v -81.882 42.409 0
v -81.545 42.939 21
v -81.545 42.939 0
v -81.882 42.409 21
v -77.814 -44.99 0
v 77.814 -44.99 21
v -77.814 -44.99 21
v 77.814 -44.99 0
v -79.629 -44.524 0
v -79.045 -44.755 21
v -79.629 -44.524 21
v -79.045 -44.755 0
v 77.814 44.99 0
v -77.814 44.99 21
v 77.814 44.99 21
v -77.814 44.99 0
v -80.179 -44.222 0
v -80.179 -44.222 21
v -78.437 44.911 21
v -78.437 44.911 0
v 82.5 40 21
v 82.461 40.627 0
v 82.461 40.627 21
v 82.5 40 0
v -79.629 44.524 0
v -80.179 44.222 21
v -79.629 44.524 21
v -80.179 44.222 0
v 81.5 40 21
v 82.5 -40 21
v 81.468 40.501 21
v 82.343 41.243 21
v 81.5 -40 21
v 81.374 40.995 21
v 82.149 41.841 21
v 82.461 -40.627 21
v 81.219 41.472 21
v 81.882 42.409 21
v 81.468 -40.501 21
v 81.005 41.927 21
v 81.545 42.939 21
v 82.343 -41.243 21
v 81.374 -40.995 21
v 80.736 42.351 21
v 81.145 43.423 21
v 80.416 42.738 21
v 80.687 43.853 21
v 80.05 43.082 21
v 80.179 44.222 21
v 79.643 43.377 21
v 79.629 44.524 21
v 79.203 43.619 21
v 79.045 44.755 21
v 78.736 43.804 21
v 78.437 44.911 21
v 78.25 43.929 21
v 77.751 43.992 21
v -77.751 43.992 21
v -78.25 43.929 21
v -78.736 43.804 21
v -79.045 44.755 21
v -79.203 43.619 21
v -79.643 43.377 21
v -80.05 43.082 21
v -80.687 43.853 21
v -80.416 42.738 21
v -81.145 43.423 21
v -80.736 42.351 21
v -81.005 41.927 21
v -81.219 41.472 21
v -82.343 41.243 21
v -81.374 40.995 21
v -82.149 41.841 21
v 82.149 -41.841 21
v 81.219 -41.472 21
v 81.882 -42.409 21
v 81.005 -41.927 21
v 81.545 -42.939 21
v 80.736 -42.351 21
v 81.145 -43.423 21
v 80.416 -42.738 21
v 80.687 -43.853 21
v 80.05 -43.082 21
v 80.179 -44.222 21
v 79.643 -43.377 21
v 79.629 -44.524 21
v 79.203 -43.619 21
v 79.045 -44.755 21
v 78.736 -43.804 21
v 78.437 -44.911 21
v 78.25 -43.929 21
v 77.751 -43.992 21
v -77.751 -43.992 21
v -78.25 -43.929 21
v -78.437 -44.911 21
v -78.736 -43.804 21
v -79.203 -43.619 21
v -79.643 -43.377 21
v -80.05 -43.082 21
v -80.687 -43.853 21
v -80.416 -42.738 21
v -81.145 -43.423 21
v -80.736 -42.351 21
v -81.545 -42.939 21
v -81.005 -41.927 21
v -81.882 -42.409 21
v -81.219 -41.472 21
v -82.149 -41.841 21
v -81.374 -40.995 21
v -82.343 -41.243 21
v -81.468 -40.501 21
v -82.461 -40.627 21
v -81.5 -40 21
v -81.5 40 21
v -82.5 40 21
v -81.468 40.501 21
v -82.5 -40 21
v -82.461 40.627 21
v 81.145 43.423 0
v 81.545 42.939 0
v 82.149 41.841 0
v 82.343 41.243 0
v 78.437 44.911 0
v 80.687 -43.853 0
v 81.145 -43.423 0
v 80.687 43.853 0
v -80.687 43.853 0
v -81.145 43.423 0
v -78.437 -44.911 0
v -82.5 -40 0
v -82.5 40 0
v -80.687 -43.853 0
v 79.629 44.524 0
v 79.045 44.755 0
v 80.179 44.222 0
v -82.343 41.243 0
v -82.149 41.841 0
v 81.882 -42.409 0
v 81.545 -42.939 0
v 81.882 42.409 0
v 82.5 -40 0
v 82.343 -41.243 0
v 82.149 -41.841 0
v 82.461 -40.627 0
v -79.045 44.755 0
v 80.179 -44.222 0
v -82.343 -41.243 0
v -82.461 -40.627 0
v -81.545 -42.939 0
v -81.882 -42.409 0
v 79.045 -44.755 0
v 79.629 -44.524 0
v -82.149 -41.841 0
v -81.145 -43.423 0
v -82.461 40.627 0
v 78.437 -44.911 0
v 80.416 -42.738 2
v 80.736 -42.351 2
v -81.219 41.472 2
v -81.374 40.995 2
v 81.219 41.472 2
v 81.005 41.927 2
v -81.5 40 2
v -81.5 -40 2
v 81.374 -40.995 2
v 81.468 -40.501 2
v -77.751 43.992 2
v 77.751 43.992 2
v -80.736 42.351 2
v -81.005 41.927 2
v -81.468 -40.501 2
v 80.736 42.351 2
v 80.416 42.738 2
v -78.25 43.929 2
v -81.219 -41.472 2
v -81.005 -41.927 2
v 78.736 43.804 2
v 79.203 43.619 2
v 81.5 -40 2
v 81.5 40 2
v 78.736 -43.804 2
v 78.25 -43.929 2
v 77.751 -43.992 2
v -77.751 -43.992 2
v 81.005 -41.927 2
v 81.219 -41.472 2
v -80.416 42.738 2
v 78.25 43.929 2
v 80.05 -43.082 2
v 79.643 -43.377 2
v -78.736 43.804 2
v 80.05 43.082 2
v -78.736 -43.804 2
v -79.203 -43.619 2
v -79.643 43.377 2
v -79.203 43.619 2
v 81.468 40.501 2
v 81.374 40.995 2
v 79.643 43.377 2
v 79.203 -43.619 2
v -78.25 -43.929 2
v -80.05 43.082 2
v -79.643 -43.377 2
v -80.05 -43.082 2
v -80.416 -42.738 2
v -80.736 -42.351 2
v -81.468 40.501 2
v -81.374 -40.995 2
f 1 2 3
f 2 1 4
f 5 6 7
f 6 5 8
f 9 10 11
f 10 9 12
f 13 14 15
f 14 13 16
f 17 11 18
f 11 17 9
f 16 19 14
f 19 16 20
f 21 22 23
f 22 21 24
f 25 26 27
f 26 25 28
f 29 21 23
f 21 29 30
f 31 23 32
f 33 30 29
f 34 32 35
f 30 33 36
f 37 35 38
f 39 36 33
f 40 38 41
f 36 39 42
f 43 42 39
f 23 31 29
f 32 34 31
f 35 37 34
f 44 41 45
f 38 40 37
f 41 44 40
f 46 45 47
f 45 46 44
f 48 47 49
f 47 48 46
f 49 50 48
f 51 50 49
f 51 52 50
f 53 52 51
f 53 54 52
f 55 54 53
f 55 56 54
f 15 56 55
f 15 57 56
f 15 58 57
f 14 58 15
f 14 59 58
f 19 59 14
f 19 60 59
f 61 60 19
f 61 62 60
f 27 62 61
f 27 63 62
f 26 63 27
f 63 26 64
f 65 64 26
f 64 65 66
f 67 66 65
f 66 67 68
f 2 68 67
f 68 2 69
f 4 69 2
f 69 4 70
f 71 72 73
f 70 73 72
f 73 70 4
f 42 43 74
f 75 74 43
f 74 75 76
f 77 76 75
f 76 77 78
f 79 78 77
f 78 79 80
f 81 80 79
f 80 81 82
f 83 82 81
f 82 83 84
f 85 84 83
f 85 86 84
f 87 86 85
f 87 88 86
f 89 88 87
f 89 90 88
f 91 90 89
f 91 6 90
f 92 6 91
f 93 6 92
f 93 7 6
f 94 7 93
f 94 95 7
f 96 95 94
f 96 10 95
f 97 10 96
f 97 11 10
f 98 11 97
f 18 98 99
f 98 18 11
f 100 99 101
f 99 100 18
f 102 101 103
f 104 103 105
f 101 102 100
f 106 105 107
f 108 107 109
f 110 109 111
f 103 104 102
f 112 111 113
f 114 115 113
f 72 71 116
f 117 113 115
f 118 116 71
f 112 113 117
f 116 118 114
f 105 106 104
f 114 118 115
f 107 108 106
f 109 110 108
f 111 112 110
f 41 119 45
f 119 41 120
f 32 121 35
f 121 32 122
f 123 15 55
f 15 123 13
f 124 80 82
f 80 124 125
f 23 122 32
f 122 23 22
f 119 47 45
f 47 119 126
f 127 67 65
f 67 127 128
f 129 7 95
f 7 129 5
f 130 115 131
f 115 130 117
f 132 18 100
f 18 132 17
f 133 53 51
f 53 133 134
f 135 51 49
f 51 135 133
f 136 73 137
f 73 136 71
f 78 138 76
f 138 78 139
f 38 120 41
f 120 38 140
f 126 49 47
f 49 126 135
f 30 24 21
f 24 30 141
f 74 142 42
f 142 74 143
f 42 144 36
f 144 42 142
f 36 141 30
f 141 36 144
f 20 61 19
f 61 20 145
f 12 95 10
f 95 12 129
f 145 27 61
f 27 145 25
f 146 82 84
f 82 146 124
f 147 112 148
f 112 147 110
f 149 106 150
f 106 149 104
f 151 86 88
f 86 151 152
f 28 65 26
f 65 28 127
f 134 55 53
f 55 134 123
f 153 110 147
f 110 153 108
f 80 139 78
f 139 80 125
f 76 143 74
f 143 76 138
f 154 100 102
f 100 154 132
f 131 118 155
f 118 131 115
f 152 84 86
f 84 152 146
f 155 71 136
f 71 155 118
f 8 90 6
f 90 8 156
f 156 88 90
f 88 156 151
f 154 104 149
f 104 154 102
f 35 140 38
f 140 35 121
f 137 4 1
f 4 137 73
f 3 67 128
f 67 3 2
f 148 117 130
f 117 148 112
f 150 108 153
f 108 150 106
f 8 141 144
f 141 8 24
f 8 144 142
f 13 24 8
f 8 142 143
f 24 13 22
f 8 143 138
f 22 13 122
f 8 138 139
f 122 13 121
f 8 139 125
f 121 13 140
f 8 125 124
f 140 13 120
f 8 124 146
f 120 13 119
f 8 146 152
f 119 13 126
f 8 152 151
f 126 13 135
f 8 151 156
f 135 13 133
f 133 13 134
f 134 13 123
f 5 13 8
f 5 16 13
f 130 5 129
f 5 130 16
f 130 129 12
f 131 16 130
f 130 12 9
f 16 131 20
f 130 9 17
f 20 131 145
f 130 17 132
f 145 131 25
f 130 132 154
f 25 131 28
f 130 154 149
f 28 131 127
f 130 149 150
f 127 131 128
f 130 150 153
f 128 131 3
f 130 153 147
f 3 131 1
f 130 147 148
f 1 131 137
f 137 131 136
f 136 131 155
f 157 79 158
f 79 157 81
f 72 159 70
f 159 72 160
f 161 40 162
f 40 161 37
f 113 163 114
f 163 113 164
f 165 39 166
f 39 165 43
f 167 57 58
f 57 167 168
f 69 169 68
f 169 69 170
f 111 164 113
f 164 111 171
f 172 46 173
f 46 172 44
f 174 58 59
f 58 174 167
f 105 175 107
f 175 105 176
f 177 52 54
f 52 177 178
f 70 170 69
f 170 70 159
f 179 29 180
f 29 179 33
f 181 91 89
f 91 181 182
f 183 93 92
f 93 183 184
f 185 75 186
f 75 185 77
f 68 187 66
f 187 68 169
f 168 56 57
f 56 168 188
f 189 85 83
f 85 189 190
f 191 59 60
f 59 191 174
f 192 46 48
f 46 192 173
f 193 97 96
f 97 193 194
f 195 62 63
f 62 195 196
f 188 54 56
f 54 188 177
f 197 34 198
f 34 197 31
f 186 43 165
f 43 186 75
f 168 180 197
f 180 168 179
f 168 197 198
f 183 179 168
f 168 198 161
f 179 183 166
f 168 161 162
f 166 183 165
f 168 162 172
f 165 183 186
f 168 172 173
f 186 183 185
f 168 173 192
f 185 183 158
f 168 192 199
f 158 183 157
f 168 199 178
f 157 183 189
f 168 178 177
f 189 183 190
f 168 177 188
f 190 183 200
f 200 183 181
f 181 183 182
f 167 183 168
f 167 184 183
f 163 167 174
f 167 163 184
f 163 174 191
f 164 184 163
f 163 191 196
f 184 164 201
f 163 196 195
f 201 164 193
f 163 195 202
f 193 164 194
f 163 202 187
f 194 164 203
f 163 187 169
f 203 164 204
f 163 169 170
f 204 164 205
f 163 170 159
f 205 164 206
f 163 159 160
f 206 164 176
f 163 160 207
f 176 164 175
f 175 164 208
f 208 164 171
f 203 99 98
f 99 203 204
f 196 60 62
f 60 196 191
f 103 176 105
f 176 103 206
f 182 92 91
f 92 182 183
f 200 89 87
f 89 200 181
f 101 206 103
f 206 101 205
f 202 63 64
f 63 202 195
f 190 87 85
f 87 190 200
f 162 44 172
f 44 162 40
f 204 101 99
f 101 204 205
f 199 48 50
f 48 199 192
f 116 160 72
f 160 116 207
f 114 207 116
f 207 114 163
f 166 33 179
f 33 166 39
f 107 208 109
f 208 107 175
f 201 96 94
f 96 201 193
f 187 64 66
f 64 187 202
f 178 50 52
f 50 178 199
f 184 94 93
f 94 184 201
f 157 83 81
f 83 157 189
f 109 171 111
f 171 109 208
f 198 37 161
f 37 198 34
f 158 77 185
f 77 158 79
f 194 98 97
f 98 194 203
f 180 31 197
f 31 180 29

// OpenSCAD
$fn = 50;


difference() {
	union() {
		hull() {
			translate(v = [-77.5000000000, 40.0000000000, 0]) {
				cylinder(h = 21, r = 5);
			}
			translate(v = [77.5000000000, 40.0000000000, 0]) {
				cylinder(h = 21, r = 5);
			}
			translate(v = [-77.5000000000, -40.0000000000, 0]) {
				cylinder(h = 21, r = 5);
			}
			translate(v = [77.5000000000, -40.0000000000, 0]) {
				cylinder(h = 21, r = 5);
			}
		}
	}
	union() {
		translate(v = [0, 0, 2]) {
			hull() {
				translate(v = [-77.5000000000, 40.0000000000, 0]) {
					cylinder(h = 19, r = 4);
				}
				translate(v = [77.5000000000, 40.0000000000, 0]) {
					cylinder(h = 19, r = 4);
				}
				translate(v = [-77.5000000000, -40.0000000000, 0]) {
					cylinder(h = 19, r = 4);
				}
				translate(v = [77.5000000000, -40.0000000000, 0]) {
					cylinder(h = 19, r = 4);
				}
			}
		}
	}
}
